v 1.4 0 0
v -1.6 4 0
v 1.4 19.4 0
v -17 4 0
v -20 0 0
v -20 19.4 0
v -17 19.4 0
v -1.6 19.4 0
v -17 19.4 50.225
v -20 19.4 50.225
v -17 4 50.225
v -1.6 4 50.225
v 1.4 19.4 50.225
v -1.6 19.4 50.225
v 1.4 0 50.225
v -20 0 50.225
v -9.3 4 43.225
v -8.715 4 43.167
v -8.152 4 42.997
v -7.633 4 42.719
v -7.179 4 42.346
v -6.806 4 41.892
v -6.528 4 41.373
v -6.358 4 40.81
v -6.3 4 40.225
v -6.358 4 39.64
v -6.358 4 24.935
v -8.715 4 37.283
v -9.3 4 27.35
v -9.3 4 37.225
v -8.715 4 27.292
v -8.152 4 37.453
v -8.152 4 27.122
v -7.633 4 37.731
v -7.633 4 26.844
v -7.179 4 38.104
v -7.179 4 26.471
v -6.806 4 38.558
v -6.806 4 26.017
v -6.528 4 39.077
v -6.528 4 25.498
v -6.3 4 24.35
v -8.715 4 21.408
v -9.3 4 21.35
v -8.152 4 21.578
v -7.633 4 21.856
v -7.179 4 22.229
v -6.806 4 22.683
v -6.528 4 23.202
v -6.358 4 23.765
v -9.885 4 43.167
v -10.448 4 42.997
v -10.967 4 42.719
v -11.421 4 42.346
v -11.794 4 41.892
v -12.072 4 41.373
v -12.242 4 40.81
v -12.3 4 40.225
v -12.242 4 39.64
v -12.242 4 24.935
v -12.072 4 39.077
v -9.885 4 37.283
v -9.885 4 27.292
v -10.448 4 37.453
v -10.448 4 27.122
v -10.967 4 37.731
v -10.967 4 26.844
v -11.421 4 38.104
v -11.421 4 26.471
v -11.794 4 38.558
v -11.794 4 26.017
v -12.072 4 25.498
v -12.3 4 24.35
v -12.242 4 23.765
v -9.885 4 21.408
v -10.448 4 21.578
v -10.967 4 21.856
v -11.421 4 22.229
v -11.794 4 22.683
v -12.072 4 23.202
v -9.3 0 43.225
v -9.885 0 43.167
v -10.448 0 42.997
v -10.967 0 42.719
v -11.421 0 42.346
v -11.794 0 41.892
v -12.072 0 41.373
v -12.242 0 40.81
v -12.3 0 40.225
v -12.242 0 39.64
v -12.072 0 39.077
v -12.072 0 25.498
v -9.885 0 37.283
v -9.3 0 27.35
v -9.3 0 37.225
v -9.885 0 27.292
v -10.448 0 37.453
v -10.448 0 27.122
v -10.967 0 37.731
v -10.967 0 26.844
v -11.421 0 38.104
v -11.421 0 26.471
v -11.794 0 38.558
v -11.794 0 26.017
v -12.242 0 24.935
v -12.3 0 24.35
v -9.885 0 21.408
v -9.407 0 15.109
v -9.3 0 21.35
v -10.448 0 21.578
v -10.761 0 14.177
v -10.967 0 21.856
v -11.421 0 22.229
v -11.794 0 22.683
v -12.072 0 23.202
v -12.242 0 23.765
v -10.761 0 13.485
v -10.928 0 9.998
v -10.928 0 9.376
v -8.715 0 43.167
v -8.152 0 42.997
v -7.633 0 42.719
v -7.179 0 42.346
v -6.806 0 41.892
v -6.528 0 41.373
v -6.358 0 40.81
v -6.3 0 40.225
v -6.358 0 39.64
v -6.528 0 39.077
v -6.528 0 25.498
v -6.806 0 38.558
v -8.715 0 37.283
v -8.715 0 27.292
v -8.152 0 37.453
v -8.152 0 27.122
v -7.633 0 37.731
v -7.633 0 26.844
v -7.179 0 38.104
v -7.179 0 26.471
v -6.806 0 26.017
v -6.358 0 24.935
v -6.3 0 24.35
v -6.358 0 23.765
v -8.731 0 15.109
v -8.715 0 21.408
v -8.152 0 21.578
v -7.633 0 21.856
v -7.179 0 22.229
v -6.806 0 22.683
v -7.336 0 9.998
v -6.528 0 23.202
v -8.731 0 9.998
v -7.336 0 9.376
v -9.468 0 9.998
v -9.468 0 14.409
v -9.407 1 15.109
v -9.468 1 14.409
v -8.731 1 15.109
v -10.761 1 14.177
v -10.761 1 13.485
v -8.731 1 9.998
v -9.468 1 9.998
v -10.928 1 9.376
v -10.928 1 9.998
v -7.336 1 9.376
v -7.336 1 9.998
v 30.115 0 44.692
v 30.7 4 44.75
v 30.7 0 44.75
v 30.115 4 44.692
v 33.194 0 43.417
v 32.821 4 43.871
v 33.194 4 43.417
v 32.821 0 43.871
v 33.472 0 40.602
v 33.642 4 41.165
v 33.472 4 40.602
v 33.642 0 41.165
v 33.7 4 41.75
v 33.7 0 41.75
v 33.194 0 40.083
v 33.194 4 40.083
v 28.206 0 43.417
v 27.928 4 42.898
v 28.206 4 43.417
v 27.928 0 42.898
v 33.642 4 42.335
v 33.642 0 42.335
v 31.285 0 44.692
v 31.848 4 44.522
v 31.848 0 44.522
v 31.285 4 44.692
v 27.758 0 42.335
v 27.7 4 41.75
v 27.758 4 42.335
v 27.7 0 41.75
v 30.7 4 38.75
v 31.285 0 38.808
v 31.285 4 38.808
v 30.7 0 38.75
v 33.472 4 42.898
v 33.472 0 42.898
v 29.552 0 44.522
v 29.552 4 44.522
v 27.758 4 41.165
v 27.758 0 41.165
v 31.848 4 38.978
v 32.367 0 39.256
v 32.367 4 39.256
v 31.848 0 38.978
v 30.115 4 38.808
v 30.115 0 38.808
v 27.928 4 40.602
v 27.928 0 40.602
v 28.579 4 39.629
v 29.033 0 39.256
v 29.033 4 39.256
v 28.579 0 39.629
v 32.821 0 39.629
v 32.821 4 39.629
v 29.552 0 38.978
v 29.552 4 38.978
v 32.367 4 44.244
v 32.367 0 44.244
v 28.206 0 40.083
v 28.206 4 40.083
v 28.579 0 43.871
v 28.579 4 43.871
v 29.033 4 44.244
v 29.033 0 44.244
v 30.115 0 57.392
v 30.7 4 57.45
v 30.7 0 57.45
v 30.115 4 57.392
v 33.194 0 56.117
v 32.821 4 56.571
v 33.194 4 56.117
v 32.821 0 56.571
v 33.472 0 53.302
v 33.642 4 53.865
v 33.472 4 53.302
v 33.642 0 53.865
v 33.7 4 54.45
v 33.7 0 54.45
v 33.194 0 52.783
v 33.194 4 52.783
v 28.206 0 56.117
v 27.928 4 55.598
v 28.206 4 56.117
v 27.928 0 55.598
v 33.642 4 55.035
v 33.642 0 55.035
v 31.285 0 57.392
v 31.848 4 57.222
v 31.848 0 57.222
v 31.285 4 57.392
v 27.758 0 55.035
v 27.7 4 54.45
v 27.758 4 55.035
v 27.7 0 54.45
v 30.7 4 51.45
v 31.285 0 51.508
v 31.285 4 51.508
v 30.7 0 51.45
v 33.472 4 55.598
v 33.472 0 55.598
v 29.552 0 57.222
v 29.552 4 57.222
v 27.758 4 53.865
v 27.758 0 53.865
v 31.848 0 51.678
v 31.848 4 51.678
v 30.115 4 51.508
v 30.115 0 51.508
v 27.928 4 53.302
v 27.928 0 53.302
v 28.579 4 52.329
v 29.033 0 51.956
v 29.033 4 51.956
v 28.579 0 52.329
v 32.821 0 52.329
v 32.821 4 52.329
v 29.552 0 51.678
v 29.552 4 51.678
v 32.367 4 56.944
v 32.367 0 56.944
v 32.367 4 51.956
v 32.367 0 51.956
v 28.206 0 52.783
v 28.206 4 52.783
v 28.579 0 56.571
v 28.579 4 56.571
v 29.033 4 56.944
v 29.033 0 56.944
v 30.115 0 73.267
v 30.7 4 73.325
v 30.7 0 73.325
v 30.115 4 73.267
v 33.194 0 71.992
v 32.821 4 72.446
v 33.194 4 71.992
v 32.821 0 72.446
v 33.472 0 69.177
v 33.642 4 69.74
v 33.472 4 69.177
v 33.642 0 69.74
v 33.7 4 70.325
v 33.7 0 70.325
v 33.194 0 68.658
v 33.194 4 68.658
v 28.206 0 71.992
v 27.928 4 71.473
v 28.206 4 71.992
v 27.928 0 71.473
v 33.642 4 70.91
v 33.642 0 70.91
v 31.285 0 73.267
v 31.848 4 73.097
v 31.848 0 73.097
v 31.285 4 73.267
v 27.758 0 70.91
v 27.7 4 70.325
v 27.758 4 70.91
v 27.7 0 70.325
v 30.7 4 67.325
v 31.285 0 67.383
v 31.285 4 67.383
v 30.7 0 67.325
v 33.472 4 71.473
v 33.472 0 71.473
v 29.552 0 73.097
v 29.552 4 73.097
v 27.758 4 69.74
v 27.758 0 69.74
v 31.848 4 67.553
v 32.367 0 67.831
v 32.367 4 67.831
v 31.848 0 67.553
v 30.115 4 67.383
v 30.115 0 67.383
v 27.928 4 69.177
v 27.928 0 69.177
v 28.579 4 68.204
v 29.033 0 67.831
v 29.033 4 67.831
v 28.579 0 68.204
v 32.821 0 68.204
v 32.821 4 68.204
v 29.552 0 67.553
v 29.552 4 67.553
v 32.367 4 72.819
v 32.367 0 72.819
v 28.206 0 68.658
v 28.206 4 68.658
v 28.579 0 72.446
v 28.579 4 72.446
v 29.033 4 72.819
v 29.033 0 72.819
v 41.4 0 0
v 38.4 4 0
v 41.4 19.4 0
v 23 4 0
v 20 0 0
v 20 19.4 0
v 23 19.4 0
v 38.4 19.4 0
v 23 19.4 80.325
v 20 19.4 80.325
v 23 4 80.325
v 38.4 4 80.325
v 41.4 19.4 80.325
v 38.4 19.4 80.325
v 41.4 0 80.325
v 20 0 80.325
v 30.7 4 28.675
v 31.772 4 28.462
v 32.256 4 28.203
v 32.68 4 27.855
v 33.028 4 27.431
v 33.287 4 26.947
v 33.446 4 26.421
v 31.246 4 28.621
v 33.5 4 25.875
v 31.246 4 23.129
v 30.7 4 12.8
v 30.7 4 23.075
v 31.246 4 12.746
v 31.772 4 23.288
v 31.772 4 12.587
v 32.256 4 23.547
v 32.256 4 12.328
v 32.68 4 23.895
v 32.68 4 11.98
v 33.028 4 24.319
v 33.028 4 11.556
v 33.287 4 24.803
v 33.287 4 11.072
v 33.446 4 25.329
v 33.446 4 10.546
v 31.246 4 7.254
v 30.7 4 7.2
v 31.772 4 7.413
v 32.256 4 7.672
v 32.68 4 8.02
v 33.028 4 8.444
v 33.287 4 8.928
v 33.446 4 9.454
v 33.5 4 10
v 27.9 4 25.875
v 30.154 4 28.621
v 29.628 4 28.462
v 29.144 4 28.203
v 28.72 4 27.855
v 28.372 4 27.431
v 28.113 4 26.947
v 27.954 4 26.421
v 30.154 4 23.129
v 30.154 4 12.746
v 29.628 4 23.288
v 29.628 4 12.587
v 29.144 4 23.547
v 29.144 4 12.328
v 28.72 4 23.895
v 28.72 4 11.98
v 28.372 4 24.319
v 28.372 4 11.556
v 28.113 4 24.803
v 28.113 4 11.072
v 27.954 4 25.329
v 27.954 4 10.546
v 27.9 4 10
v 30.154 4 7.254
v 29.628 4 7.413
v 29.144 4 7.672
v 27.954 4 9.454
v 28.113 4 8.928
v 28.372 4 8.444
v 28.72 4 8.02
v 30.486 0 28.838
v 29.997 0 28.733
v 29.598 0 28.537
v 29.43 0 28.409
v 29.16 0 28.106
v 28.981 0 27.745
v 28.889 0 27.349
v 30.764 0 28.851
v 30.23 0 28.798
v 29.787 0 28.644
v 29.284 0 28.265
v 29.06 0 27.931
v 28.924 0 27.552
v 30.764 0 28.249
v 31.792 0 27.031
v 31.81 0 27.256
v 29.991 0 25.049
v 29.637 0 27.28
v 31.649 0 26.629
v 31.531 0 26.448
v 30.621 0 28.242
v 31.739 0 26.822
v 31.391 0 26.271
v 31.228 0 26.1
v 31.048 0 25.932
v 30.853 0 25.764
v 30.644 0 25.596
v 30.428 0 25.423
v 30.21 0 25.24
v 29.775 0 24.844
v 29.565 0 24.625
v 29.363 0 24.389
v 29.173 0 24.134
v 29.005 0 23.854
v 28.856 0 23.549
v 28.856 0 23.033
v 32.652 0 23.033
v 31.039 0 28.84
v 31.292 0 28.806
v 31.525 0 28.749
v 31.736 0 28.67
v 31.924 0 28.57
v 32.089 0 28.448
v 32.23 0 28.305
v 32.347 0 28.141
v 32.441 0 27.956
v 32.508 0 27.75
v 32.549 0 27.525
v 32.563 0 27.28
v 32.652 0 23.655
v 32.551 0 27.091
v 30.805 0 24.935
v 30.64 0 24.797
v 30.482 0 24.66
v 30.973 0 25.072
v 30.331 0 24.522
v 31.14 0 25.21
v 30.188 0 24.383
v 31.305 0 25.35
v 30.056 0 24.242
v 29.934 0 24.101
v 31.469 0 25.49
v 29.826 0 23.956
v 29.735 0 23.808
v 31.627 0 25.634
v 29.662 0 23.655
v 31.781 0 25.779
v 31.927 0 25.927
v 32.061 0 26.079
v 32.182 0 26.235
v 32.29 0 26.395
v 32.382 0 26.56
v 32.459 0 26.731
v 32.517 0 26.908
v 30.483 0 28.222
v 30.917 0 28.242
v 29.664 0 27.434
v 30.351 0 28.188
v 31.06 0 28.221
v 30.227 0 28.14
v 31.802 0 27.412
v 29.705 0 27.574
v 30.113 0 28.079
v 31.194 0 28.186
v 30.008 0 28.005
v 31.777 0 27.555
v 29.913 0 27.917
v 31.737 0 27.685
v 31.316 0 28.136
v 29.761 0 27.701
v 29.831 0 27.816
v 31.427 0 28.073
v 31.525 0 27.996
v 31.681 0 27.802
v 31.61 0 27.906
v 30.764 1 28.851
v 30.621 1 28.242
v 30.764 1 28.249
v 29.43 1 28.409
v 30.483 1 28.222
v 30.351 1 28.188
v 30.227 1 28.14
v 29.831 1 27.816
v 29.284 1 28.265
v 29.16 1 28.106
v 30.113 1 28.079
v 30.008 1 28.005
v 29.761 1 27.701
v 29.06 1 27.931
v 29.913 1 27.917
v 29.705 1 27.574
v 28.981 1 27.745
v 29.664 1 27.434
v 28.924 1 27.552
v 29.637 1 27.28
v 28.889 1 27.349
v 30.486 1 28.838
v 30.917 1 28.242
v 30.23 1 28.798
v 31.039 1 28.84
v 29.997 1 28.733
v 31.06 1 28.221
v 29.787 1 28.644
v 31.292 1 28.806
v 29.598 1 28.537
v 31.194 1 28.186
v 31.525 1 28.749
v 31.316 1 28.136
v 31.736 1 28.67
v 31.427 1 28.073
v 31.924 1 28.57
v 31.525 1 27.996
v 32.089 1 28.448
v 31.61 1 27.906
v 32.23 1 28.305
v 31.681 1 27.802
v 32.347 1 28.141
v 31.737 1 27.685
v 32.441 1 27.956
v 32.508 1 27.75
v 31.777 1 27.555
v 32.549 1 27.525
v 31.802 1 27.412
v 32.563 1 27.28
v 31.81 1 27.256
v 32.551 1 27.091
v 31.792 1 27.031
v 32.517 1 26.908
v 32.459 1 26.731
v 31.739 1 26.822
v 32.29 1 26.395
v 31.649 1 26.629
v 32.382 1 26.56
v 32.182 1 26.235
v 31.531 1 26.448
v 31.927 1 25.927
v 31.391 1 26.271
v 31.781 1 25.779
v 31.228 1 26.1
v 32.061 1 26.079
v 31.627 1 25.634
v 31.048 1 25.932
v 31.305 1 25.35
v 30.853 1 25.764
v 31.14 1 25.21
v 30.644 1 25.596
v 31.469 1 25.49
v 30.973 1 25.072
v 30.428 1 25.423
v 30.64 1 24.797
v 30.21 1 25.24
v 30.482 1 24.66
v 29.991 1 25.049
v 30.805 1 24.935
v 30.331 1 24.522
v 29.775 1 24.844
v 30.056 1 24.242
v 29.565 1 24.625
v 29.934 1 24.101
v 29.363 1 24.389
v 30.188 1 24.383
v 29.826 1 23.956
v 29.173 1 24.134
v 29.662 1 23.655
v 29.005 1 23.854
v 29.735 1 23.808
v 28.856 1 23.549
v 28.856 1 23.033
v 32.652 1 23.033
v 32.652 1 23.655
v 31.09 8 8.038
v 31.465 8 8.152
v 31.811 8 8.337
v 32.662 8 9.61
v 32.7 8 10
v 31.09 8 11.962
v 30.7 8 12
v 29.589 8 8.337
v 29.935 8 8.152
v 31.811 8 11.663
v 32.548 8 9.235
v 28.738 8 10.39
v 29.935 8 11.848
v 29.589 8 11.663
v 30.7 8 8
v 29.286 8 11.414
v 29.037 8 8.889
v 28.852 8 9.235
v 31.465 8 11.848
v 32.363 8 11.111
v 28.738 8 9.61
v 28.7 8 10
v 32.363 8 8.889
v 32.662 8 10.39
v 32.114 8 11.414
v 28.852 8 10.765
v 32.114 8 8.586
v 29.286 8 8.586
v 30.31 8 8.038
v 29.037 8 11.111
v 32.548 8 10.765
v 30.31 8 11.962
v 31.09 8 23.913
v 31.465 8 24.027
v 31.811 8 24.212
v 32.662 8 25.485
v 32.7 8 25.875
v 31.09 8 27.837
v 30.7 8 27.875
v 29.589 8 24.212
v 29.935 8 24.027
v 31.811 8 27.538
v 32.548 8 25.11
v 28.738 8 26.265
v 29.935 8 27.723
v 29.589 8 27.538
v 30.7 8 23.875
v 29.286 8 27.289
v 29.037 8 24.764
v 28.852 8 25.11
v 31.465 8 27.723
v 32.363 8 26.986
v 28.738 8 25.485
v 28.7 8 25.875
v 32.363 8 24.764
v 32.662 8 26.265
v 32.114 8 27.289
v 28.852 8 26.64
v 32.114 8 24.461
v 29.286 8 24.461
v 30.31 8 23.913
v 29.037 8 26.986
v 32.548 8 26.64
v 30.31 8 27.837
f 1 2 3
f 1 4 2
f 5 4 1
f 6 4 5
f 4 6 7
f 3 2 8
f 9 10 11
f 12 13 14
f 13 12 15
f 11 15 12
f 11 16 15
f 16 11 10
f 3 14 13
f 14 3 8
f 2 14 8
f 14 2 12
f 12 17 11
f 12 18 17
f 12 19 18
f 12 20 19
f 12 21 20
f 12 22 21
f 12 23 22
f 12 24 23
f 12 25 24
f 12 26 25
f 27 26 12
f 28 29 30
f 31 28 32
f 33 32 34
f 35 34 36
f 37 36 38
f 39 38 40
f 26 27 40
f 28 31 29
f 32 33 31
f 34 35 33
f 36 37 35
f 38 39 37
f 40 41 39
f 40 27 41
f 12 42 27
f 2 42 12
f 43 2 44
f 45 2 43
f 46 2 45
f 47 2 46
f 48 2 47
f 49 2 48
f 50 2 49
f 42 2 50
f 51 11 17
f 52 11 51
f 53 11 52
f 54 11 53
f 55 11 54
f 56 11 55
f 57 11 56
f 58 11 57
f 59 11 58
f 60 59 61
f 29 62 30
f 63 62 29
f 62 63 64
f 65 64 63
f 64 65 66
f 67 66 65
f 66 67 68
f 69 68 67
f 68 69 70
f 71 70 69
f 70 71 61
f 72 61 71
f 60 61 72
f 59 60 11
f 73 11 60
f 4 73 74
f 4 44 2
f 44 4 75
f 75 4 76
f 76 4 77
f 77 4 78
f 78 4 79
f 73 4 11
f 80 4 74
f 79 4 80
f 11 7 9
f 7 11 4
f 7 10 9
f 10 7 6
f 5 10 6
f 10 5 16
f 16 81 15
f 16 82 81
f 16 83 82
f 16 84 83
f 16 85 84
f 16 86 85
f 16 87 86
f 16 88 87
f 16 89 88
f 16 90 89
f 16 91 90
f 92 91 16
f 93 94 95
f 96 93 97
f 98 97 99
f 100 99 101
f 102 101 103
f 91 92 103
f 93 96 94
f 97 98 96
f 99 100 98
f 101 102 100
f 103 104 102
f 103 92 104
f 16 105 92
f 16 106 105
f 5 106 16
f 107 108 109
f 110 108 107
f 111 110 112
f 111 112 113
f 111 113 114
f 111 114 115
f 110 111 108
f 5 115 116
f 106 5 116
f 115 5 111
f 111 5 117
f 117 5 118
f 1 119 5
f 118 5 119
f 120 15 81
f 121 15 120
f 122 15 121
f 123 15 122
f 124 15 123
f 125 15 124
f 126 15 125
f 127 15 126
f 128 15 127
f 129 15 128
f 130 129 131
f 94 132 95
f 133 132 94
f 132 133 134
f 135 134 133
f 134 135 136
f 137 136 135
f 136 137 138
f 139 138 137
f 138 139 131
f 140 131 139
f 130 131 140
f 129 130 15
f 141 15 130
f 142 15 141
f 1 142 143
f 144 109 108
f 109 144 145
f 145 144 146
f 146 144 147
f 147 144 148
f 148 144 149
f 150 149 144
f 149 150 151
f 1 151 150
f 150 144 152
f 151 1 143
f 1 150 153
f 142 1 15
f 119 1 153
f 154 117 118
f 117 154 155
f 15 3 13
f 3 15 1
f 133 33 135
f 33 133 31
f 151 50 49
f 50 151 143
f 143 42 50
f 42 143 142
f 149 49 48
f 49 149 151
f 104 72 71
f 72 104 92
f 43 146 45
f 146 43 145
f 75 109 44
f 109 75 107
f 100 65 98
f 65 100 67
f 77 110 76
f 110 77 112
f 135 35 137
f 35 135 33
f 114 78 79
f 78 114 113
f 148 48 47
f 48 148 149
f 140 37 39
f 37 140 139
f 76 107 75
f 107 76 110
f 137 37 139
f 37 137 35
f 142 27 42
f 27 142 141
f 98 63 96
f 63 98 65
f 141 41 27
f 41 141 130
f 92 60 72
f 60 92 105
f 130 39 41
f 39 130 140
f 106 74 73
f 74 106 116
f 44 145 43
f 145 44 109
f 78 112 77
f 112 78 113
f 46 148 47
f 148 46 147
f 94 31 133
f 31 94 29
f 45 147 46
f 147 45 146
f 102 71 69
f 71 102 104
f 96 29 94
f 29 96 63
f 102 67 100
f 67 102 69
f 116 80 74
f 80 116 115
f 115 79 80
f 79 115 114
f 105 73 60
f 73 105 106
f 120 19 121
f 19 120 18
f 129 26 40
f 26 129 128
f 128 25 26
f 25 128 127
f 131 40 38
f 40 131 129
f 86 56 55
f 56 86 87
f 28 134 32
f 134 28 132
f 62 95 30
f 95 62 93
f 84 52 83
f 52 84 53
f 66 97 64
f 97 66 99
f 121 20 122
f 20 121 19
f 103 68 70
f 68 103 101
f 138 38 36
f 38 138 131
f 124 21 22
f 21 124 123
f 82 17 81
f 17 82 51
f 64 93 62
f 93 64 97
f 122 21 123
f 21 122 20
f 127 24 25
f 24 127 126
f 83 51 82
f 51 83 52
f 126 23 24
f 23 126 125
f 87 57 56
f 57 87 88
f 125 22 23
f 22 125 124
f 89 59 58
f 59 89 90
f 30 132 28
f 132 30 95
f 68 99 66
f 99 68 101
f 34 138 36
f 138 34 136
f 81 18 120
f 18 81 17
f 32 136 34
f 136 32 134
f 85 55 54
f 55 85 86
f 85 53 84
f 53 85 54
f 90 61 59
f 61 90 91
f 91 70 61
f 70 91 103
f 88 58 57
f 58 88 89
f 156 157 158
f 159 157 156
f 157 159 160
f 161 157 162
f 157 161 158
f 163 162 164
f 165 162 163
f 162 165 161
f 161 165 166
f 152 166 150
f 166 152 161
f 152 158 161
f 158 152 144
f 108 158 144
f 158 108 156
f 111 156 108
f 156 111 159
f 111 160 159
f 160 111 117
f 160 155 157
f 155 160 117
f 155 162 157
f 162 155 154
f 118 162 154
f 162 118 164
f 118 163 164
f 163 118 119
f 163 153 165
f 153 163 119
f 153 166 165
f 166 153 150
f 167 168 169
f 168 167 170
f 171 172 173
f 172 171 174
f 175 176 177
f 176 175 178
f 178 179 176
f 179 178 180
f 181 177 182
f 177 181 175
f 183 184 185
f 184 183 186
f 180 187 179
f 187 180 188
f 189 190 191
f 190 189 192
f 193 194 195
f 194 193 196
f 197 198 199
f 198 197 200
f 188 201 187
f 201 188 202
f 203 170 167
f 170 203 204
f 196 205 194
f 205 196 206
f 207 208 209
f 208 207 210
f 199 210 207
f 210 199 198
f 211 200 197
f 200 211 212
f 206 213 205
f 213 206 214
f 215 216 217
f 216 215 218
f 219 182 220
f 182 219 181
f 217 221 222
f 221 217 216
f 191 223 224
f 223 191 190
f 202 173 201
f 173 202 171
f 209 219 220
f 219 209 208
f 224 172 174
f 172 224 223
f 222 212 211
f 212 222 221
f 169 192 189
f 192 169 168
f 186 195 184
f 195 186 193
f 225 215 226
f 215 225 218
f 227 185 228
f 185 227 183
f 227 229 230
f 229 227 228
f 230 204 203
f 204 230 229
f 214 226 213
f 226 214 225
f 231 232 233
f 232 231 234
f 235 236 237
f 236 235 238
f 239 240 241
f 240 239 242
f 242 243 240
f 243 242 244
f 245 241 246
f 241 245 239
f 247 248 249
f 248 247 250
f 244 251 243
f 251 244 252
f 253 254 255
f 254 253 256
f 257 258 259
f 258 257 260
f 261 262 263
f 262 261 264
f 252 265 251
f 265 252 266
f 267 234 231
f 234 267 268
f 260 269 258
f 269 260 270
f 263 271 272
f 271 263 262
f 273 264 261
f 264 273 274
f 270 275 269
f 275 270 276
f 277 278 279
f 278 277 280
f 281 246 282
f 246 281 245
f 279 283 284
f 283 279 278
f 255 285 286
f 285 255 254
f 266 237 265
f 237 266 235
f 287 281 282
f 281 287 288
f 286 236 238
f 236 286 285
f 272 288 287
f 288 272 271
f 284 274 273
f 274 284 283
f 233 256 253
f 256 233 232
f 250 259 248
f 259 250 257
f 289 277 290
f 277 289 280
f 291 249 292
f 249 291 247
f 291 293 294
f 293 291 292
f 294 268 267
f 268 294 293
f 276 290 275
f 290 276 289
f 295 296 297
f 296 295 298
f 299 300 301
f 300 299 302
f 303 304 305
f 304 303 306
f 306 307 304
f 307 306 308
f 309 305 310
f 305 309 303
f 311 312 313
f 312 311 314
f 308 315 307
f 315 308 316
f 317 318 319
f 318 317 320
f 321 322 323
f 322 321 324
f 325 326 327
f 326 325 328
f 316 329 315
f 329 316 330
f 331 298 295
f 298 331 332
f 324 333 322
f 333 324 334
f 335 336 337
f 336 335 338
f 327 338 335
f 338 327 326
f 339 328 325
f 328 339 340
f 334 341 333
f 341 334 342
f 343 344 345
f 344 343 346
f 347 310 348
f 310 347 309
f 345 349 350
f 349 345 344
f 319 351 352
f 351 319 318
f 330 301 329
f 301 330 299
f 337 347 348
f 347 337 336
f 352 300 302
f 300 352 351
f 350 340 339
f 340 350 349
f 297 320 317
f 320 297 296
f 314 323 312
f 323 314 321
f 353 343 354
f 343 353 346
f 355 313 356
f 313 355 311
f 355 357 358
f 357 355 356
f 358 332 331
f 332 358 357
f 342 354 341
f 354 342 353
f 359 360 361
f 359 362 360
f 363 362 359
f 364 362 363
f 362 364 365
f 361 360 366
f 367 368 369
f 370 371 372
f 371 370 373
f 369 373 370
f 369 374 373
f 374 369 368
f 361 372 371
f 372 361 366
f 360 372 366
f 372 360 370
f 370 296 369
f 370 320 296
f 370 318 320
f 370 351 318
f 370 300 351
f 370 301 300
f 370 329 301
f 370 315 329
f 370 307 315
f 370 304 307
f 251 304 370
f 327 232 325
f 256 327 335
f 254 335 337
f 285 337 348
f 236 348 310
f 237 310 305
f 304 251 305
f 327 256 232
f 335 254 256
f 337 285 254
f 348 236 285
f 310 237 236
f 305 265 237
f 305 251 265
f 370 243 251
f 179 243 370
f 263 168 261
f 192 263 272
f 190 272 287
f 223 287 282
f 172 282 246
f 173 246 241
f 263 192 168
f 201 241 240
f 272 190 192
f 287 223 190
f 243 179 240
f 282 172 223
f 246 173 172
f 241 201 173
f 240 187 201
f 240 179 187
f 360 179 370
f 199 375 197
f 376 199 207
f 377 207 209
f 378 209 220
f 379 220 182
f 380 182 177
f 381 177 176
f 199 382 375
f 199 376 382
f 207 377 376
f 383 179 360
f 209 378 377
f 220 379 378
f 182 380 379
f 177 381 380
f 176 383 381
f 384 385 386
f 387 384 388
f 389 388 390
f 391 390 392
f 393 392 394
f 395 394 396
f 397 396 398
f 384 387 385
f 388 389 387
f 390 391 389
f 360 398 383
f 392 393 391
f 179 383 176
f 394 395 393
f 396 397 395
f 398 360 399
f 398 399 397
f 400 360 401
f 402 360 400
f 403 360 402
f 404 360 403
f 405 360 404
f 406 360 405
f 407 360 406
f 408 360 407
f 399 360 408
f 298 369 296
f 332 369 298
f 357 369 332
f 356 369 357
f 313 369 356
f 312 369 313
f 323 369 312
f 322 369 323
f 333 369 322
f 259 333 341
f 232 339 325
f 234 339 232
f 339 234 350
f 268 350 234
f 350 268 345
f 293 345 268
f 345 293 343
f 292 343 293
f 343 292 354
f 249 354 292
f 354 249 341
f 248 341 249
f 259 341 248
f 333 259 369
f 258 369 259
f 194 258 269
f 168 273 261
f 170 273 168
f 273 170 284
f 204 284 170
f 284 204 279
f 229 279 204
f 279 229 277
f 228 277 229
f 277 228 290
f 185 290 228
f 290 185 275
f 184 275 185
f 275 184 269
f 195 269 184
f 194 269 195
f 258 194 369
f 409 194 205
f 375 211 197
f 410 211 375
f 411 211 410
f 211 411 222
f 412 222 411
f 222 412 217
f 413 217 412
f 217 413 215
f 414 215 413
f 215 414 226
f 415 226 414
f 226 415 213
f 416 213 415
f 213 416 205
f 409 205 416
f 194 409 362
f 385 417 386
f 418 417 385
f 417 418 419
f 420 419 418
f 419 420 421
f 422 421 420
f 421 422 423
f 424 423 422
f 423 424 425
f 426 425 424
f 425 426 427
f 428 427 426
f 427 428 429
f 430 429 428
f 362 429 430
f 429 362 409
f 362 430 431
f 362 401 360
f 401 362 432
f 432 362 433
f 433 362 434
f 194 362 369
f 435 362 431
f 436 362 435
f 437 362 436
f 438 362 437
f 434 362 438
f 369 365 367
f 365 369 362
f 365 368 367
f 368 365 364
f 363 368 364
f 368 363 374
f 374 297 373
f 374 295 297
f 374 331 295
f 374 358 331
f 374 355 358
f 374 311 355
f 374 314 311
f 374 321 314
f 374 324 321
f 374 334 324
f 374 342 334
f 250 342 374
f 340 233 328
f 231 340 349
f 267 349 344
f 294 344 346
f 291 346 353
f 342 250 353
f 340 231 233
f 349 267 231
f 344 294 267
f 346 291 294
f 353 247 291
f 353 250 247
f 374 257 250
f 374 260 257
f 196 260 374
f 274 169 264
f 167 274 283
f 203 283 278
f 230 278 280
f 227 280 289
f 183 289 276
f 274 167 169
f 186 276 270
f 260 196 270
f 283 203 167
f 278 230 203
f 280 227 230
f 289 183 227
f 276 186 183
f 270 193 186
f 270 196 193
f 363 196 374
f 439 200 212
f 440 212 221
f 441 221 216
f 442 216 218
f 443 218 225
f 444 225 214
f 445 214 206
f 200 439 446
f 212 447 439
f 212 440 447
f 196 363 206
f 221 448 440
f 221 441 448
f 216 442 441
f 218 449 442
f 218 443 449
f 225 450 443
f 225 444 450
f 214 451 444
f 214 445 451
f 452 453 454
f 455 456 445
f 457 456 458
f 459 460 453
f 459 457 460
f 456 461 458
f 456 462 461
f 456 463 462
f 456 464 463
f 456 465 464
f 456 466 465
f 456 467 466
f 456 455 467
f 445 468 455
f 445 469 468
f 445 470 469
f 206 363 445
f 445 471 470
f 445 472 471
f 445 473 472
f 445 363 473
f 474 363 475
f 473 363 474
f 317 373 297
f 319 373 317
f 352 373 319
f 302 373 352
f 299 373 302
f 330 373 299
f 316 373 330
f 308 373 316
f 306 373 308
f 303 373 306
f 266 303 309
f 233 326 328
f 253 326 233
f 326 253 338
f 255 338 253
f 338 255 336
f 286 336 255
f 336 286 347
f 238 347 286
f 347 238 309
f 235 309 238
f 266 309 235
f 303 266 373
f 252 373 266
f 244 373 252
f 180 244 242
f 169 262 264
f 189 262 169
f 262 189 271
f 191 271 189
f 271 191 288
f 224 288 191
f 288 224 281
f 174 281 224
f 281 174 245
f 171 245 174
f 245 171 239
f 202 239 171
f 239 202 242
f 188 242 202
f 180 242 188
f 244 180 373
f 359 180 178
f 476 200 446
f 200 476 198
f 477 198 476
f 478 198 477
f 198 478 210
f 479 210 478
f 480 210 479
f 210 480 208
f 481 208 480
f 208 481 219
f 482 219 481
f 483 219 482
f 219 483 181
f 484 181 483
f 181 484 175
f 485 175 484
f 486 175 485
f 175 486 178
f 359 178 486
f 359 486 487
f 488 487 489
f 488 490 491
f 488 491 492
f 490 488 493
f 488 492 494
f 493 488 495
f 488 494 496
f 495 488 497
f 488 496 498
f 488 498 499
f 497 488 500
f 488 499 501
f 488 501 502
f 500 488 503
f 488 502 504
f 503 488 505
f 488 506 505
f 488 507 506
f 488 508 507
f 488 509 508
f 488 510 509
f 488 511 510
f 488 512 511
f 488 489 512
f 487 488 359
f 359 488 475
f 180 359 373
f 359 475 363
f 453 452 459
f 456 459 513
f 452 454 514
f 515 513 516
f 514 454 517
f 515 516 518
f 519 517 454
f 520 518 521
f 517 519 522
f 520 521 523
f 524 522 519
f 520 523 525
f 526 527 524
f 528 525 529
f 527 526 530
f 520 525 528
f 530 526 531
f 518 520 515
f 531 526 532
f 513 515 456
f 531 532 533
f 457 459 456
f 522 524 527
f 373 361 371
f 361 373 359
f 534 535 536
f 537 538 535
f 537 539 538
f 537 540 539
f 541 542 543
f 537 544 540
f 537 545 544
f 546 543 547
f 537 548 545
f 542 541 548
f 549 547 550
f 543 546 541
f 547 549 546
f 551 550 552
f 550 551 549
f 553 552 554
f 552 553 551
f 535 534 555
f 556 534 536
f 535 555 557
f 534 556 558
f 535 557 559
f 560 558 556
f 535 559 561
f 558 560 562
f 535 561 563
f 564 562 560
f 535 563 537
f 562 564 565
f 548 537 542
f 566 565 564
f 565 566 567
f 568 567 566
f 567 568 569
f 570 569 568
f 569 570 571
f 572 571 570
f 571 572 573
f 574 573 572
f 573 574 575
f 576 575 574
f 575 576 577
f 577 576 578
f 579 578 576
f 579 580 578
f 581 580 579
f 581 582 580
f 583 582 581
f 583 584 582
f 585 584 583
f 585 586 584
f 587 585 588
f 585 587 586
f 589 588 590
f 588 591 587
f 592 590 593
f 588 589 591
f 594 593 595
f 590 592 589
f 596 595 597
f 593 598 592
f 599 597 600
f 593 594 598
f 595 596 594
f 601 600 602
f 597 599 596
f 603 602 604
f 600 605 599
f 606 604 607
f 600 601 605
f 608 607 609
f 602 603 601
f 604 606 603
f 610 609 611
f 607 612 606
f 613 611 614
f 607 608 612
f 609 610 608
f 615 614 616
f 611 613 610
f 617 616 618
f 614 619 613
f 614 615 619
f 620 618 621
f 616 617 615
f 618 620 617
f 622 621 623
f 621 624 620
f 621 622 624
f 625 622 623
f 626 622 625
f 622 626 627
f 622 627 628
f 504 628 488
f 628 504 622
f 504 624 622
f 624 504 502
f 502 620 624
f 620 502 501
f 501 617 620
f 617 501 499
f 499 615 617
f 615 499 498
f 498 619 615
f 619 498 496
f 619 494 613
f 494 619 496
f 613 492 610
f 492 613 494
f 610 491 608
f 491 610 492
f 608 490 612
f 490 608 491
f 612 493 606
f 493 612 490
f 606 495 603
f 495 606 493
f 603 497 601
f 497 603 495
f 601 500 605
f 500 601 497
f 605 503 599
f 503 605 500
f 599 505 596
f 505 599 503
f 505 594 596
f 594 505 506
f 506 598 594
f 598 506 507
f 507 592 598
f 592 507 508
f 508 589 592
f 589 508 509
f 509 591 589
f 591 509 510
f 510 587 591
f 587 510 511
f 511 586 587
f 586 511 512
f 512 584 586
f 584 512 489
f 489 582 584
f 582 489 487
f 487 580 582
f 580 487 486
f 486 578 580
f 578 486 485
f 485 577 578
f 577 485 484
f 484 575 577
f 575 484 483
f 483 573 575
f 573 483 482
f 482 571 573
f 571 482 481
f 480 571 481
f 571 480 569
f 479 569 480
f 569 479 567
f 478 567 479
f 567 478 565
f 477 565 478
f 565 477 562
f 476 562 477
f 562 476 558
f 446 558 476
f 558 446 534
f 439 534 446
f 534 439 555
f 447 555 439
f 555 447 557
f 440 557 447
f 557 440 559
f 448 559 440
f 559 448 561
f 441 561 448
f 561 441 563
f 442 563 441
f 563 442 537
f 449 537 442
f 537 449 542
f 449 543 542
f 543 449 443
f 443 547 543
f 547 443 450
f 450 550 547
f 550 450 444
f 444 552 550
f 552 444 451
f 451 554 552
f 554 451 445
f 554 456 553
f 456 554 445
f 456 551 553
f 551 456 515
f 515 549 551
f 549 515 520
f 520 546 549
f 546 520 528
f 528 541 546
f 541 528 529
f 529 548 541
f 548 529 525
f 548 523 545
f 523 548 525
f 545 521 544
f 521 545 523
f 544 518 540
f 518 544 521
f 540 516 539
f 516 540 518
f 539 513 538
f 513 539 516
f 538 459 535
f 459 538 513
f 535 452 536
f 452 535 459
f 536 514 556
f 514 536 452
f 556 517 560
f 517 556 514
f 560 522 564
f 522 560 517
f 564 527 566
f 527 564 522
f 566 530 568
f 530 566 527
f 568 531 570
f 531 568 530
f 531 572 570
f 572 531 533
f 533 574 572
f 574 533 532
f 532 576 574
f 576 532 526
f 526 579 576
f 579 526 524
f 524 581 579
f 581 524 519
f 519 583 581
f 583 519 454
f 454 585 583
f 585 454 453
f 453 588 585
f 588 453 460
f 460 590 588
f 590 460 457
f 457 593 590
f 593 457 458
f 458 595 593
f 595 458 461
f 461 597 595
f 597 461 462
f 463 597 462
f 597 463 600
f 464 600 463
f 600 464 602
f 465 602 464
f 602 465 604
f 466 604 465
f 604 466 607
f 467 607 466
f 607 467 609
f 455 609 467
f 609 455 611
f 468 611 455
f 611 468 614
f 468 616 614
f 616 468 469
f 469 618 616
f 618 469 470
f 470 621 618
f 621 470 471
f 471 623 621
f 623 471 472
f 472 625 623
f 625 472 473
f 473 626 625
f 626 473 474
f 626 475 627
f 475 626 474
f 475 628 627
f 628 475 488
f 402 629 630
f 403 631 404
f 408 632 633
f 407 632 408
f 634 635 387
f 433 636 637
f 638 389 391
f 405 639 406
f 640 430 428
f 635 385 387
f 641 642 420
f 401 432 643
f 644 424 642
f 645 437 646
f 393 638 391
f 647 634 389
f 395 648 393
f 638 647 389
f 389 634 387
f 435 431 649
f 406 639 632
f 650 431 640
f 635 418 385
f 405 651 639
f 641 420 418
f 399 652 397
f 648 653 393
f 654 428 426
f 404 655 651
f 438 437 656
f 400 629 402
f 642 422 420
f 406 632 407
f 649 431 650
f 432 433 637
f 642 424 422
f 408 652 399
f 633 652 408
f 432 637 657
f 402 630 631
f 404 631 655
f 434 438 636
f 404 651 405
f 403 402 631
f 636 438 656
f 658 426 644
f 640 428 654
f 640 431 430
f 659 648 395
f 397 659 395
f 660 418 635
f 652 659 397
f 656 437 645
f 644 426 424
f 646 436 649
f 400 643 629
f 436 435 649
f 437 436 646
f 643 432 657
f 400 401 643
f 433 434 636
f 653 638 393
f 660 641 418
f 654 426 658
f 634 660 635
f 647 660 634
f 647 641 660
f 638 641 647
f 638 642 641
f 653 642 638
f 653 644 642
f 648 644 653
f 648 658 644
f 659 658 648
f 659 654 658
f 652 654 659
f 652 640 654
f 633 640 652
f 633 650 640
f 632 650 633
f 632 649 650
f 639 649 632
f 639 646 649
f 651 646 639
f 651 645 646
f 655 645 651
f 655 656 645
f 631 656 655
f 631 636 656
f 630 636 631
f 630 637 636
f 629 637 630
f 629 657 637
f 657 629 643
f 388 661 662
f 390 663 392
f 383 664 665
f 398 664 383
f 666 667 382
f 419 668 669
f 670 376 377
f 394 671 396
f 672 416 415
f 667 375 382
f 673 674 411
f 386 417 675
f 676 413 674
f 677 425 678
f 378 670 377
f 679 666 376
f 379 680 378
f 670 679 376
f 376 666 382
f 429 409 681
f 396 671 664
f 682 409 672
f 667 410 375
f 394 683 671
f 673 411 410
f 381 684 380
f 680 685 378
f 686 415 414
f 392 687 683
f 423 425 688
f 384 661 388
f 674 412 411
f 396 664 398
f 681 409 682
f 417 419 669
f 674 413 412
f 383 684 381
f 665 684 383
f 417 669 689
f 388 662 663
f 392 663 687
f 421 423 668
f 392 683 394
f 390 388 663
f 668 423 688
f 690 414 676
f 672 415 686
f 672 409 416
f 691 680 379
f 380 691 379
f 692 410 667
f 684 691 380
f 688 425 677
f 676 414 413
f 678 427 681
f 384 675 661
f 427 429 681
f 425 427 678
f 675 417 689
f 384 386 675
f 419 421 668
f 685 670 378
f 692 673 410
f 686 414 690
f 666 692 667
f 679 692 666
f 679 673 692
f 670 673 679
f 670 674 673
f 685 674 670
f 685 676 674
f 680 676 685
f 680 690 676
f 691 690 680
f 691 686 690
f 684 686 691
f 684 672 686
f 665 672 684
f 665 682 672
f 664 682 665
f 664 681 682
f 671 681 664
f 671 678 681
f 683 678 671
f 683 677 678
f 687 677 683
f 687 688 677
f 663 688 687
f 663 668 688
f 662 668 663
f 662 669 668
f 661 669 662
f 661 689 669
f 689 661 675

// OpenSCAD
// file: constants.scad
// Constantes pour le meuble Rack 10 pouces
// Unité de base : mm

// Unité de rack (U) standard
U = 44.45;

// Nombre d'unités (U) pour la hauteur interne
total_U = 22; // ~1 mètre

// Dimensions internes du rack
// Largeur de la façade (10 pouces)
panel_width = 254; 
panel_margin = 4; // Marge entre le panneau et le profilé

// Largeur utile interne (entre les rails)
rack_internal_width = 236; 

// Profondeur du meuble
rack_depth = 300; // 30 cm de profondeur totale
tech_zone_depth = 100; // 10 cm pour les alims et câbles au fond
device_zone_depth = rack_depth - tech_zone_depth; // 20 cm pour les appareils

// Dimensions des matériaux
metal_profile_size = 15; // Profilé carré acier 15x15mm
wood_thickness = 18; // Épaisseur des planches en bois
wood_overhang = 0; // Aucun débordement, la planche est à fleur du cadre
// main file
include <constants.scad>

// Tolérance pour glisser sur le tube acier
play = 0.4; // 0.4mm de marge totale (0.2 par côté) pour glisser facilement sans forcer
inner_w = metal_profile_size + play;
inner_d = metal_profile_size + play;

wall_thick = 4; // Épaisseur de la face de perçage (suffisante pour bien guider le foret)
side_thick = 3; // Épaisseur des pattes latérales du U

drill_radius = 3.0; // Pour un foret métal de 6mm

// Forme de base (U-channel) qui vient épouser le profilé carré
module u_channel_profile() {
    difference() {
        // Bloc extérieur
        square([inner_w + 2*side_thick, inner_d + wall_thick]);
        // Creux intérieur pour le profilé acier
        translate([side_thick, wall_thick])
            square([inner_w, inner_d + 1]); 
    }
}

// ==========================================
// Gabarit 1 : DÉMARREUR
// À poser en butée sur la traverse horizontale en acier.
// Il donne automatiquement la hauteur parfaite pour les 2 premiers trous,
// en prenant en compte l'épaisseur de la planche en bois.
// ==========================================
module starter_jig() {
    // Hauteur du premier trou par rapport à la traverse acier
    h1 = wood_thickness + 6.35;
    h2 = h1 + 15.875;
    
    height = h2 + 10; // On ajoute 10mm de marge au-dessus
    
    color("Cyan")
    difference() {
        linear_extrude(height) u_channel_profile();
            
        // Trou 1
        translate([side_thick + inner_w/2, 0, h1])
            rotate([-90, 0, 0])
            cylinder(r=drill_radius, h=wall_thick*3, center=true, $fn=32);
            
        // Trou 2
        translate([side_thick + inner_w/2, 0, h2])
            rotate([-90, 0, 0])
            cylinder(r=drill_radius, h=wall_thick*3, center=true, $fn=32);
            
        // Gravure "1"
        translate([side_thick + inner_w/2, 1, h1/2])
            rotate([90, 0, 0])
            linear_extrude(2)
            text("1", size=6, halign="center", valign="center");
    }
}

// ==========================================
// Gabarit 2 : EXTENSION
// À brancher dans les 2 trous précédents via ses tétons.
// Permet de percer les 3 trous suivants avec l'espacement parfait EIA-310.
// (Il suffit de le décaler de 2 trous en 2 trous pour faire toute la hauteur).
// ==========================================
module extension_jig() {
    z_offset = 10; // Marge en bas pour solidifier les tétons
    
    // Distances standard EIA-310 : 15.875, 15.875, 12.7
    // Tétons insérés dans les trous 0 et 1 (espacés de 15.875)
    t0 = 0;
    t1 = 15.875;
    
    // Nouveaux trous à percer
    t2 = t1 + 15.875; // 31.75
    t3 = t2 + 12.7;   // 44.45
    t4 = t3 + 15.875; // 60.325
    
    height = t4 + z_offset + 10; 
    
    color("LimeGreen")
    union() {
        difference() {
            // Corps
            linear_extrude(height) u_channel_profile();
                
            // Trous de perçage
            for (z = [t2, t3, t4]) {
                translate([side_thick + inner_w/2, 0, z + z_offset])
                    rotate([-90, 0, 0])
                    cylinder(r=drill_radius, h=wall_thick*3, center=true, $fn=32);
            }
            
            // Gravure "2"
            translate([side_thick + inner_w/2, 1, z_offset + t2/2])
                rotate([90, 0, 0])
                linear_extrude(2)
                text("2", size=6, halign="center", valign="center");
        }
        
        // Tétons de centrage (rentrent dans les trous de 6mm du châssis)
        // Coniques pour une insertion facile et sans jeu (r base = 2.8, r pointe = 2.0)
        for (z = [t0, t1]) {
            translate([side_thick + inner_w/2, wall_thick, z + z_offset])
                rotate([-90, 0, 0])
                cylinder(r1=2.8, r2=2.0, h=4, $fn=32);
        }
    }
}

// Affichage par défaut pour générer les STL
translate([-20, 0, 0]) starter_jig();
translate([20, 0, 0]) extension_jig();
